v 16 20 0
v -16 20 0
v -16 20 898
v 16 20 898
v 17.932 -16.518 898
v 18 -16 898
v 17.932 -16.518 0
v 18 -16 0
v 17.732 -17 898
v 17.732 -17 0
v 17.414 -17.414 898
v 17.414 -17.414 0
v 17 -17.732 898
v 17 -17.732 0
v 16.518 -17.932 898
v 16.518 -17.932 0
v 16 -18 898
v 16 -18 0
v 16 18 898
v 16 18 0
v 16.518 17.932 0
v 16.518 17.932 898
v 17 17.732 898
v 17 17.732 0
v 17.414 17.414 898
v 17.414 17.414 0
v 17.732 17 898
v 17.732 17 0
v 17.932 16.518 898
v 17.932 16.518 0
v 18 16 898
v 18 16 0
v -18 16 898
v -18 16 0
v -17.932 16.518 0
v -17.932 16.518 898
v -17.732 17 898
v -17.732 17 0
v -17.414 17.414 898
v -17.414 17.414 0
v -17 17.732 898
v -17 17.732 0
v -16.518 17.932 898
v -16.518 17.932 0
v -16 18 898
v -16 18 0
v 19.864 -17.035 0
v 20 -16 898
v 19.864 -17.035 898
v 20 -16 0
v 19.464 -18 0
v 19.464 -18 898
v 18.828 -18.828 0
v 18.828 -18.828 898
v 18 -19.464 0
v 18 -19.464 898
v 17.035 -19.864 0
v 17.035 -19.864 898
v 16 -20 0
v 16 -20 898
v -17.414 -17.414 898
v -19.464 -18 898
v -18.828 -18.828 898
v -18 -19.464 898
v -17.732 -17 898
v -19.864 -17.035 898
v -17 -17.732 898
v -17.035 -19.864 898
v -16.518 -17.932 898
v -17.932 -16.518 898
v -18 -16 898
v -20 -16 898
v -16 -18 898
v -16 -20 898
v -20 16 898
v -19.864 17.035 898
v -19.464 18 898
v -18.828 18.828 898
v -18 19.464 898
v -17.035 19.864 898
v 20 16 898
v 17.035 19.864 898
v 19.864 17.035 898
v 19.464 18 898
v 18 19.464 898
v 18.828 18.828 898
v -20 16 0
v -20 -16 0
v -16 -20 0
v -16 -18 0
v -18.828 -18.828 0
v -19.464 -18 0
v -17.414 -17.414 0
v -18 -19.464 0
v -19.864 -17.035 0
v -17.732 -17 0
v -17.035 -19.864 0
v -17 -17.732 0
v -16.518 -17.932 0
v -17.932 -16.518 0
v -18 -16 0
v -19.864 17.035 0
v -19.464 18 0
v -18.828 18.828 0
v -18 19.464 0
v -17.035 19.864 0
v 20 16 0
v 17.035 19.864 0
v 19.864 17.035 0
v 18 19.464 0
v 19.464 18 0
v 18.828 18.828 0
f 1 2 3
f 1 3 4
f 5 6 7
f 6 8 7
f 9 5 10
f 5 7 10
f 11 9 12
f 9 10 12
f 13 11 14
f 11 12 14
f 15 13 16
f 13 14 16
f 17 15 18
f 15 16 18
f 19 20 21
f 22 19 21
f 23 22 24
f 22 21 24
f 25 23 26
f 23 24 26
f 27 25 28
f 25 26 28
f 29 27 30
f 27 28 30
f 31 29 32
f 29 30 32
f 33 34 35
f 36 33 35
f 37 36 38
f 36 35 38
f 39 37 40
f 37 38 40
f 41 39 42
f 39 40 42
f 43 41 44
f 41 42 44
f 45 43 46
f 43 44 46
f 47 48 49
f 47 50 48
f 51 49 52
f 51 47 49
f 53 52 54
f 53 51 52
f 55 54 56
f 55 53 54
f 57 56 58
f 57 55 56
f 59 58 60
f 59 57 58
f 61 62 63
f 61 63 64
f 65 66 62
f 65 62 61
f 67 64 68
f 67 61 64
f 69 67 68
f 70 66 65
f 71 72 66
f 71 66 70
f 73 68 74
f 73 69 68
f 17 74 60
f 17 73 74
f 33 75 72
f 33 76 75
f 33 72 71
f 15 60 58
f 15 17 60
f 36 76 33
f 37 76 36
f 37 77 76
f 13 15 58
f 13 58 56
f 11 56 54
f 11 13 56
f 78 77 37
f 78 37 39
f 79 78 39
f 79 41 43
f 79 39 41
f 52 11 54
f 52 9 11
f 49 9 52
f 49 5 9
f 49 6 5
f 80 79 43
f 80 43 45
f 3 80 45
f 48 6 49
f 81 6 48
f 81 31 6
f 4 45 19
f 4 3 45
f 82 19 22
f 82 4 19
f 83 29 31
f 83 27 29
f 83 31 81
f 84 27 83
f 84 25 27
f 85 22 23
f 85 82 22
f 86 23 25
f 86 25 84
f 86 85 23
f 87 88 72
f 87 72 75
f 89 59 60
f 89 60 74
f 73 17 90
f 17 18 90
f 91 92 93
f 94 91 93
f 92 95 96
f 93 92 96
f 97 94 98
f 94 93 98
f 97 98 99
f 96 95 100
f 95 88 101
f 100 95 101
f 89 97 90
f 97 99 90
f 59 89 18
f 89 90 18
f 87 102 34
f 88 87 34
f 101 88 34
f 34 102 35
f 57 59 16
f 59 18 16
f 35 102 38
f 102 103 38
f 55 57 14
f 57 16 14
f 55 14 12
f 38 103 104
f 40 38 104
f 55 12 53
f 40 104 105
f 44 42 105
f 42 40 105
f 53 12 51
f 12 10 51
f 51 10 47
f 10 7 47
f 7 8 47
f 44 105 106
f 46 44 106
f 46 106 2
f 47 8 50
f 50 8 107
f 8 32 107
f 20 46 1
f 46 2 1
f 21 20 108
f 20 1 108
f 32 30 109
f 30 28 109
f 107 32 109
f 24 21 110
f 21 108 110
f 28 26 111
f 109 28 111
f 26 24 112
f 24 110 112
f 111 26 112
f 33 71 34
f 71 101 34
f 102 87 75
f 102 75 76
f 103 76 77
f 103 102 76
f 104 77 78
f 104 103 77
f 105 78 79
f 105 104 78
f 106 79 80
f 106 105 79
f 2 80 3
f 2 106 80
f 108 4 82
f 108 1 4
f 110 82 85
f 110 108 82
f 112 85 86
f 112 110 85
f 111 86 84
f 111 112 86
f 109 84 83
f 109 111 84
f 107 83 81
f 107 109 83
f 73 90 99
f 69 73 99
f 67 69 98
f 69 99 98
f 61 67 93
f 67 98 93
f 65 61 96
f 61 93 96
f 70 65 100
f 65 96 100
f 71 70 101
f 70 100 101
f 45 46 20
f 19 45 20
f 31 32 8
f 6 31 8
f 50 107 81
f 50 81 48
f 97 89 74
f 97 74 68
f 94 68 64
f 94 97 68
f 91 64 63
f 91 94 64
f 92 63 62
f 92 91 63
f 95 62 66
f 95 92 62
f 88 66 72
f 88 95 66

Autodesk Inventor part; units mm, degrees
ref_plane "YZ Plane" through (0, 0, 0) normal (1, 0, 0) x (0, 1, 0)
ref_plane "Start Plane" through (0, 0, 0) normal (0, 0, 1) x (1, 0, 0)
ref_plane "End Plane" through (0, 0, 898) normal (0, 0, 1) x (1, 0, 0)
sketch "Sketch" plane through (0, 0, 0) normal (0, 0, 1) x (1, 0, 0)
  line L0 (-20, -16) -> (-20, 16)
  line L1 (-16, 20) -> (16, 20)
  line L2 (20, 16) -> (20, -16)
  line L3 (16, -20) -> (-16, -20)
  arc A0 (-20, -16) -> (-16, -20) centre (-16, -16) ccw
  arc A1 (20, 16) -> (16, 20) centre (16, 16) ccw
  arc A2 (-16, 20) -> (-20, 16) centre (-16, 16) ccw
  arc A3 (16, -20) -> (20, -16) centre (16, -16) ccw
  arc A4 (-16, 18) -> (-18, 16) centre (-16, 16) ccw
  line L4 (-16, 18) -> (16, 18)
  arc A5 (18, 16) -> (16, 18) centre (16, 16) ccw
  line L5 (18, 16) -> (18, -16)
  arc A6 (16, -18) -> (18, -16) centre (16, -16) ccw
  line L6 (16, -18) -> (-16, -18)
  arc A7 (-18, -16) -> (-16, -18) centre (-16, -16) ccw
  line L7 (-18, -16) -> (-18, 16)
  line L8 (0, 29.1598) -> (0, -29.1598) construction
  line L9 (-29.1598, 0) -> (29.1598, 0) construction
  dimension "d7" = 4
  dimension "d9" = 40
  dimension "d11" = 40
  dimension "d12" = 2
  dimension "d15" = 20
  dimension "d16" = 20
extrude "Body" add sketch "Sketch" along normal up to surface (898 mm away) from surface at 0
sketch "Sketch3" plane through (0, 0, 0) normal (0, 0, 1) x (1, 0, 0)
  line L0 (0, 0) -> (10, 0)
ref_plane "Work Plane3" through (0, 0, 0) normal (0, -1, 0) x (1, 0, 0)
sketch "Sketch4" plane through (0, 0, 0) normal (0, -1, 0) x (1, 0, 0)
  line L0 (-2, 0) -> (12, 0) projected
  line L1 (-2, 898) -> (12, 898) projected
  dimension "d18" = 898
equation "\"d7\" = G_IR"
equation "\"d9\" = G_W"
equation "\"d11\" = G_H"
equation "\"d12\" = G_T"
equation "\"d15\" = 0.5 * d9"
equation "\"d16\" = 0.5 * d11"
equation "\"d3\" = G_L"
equation "\"G_W\" = 40"
equation "\"G_H\" = 40"
equation "\"G_T\" = 2"
equation "\"G_IR\" = 4"
equation "\"G_L\" = d18"
equation "\"G_OFFSET_START\" = 0"
equation "\"d14\" = G_OFFSET_END + B_L"
equation "\"B_L\" = 938"
equation "\"G_OFFSET_END\" = -40"
properties part number "ISO 4019 - 40x40x2 - 898" material "Steel, Mild"
